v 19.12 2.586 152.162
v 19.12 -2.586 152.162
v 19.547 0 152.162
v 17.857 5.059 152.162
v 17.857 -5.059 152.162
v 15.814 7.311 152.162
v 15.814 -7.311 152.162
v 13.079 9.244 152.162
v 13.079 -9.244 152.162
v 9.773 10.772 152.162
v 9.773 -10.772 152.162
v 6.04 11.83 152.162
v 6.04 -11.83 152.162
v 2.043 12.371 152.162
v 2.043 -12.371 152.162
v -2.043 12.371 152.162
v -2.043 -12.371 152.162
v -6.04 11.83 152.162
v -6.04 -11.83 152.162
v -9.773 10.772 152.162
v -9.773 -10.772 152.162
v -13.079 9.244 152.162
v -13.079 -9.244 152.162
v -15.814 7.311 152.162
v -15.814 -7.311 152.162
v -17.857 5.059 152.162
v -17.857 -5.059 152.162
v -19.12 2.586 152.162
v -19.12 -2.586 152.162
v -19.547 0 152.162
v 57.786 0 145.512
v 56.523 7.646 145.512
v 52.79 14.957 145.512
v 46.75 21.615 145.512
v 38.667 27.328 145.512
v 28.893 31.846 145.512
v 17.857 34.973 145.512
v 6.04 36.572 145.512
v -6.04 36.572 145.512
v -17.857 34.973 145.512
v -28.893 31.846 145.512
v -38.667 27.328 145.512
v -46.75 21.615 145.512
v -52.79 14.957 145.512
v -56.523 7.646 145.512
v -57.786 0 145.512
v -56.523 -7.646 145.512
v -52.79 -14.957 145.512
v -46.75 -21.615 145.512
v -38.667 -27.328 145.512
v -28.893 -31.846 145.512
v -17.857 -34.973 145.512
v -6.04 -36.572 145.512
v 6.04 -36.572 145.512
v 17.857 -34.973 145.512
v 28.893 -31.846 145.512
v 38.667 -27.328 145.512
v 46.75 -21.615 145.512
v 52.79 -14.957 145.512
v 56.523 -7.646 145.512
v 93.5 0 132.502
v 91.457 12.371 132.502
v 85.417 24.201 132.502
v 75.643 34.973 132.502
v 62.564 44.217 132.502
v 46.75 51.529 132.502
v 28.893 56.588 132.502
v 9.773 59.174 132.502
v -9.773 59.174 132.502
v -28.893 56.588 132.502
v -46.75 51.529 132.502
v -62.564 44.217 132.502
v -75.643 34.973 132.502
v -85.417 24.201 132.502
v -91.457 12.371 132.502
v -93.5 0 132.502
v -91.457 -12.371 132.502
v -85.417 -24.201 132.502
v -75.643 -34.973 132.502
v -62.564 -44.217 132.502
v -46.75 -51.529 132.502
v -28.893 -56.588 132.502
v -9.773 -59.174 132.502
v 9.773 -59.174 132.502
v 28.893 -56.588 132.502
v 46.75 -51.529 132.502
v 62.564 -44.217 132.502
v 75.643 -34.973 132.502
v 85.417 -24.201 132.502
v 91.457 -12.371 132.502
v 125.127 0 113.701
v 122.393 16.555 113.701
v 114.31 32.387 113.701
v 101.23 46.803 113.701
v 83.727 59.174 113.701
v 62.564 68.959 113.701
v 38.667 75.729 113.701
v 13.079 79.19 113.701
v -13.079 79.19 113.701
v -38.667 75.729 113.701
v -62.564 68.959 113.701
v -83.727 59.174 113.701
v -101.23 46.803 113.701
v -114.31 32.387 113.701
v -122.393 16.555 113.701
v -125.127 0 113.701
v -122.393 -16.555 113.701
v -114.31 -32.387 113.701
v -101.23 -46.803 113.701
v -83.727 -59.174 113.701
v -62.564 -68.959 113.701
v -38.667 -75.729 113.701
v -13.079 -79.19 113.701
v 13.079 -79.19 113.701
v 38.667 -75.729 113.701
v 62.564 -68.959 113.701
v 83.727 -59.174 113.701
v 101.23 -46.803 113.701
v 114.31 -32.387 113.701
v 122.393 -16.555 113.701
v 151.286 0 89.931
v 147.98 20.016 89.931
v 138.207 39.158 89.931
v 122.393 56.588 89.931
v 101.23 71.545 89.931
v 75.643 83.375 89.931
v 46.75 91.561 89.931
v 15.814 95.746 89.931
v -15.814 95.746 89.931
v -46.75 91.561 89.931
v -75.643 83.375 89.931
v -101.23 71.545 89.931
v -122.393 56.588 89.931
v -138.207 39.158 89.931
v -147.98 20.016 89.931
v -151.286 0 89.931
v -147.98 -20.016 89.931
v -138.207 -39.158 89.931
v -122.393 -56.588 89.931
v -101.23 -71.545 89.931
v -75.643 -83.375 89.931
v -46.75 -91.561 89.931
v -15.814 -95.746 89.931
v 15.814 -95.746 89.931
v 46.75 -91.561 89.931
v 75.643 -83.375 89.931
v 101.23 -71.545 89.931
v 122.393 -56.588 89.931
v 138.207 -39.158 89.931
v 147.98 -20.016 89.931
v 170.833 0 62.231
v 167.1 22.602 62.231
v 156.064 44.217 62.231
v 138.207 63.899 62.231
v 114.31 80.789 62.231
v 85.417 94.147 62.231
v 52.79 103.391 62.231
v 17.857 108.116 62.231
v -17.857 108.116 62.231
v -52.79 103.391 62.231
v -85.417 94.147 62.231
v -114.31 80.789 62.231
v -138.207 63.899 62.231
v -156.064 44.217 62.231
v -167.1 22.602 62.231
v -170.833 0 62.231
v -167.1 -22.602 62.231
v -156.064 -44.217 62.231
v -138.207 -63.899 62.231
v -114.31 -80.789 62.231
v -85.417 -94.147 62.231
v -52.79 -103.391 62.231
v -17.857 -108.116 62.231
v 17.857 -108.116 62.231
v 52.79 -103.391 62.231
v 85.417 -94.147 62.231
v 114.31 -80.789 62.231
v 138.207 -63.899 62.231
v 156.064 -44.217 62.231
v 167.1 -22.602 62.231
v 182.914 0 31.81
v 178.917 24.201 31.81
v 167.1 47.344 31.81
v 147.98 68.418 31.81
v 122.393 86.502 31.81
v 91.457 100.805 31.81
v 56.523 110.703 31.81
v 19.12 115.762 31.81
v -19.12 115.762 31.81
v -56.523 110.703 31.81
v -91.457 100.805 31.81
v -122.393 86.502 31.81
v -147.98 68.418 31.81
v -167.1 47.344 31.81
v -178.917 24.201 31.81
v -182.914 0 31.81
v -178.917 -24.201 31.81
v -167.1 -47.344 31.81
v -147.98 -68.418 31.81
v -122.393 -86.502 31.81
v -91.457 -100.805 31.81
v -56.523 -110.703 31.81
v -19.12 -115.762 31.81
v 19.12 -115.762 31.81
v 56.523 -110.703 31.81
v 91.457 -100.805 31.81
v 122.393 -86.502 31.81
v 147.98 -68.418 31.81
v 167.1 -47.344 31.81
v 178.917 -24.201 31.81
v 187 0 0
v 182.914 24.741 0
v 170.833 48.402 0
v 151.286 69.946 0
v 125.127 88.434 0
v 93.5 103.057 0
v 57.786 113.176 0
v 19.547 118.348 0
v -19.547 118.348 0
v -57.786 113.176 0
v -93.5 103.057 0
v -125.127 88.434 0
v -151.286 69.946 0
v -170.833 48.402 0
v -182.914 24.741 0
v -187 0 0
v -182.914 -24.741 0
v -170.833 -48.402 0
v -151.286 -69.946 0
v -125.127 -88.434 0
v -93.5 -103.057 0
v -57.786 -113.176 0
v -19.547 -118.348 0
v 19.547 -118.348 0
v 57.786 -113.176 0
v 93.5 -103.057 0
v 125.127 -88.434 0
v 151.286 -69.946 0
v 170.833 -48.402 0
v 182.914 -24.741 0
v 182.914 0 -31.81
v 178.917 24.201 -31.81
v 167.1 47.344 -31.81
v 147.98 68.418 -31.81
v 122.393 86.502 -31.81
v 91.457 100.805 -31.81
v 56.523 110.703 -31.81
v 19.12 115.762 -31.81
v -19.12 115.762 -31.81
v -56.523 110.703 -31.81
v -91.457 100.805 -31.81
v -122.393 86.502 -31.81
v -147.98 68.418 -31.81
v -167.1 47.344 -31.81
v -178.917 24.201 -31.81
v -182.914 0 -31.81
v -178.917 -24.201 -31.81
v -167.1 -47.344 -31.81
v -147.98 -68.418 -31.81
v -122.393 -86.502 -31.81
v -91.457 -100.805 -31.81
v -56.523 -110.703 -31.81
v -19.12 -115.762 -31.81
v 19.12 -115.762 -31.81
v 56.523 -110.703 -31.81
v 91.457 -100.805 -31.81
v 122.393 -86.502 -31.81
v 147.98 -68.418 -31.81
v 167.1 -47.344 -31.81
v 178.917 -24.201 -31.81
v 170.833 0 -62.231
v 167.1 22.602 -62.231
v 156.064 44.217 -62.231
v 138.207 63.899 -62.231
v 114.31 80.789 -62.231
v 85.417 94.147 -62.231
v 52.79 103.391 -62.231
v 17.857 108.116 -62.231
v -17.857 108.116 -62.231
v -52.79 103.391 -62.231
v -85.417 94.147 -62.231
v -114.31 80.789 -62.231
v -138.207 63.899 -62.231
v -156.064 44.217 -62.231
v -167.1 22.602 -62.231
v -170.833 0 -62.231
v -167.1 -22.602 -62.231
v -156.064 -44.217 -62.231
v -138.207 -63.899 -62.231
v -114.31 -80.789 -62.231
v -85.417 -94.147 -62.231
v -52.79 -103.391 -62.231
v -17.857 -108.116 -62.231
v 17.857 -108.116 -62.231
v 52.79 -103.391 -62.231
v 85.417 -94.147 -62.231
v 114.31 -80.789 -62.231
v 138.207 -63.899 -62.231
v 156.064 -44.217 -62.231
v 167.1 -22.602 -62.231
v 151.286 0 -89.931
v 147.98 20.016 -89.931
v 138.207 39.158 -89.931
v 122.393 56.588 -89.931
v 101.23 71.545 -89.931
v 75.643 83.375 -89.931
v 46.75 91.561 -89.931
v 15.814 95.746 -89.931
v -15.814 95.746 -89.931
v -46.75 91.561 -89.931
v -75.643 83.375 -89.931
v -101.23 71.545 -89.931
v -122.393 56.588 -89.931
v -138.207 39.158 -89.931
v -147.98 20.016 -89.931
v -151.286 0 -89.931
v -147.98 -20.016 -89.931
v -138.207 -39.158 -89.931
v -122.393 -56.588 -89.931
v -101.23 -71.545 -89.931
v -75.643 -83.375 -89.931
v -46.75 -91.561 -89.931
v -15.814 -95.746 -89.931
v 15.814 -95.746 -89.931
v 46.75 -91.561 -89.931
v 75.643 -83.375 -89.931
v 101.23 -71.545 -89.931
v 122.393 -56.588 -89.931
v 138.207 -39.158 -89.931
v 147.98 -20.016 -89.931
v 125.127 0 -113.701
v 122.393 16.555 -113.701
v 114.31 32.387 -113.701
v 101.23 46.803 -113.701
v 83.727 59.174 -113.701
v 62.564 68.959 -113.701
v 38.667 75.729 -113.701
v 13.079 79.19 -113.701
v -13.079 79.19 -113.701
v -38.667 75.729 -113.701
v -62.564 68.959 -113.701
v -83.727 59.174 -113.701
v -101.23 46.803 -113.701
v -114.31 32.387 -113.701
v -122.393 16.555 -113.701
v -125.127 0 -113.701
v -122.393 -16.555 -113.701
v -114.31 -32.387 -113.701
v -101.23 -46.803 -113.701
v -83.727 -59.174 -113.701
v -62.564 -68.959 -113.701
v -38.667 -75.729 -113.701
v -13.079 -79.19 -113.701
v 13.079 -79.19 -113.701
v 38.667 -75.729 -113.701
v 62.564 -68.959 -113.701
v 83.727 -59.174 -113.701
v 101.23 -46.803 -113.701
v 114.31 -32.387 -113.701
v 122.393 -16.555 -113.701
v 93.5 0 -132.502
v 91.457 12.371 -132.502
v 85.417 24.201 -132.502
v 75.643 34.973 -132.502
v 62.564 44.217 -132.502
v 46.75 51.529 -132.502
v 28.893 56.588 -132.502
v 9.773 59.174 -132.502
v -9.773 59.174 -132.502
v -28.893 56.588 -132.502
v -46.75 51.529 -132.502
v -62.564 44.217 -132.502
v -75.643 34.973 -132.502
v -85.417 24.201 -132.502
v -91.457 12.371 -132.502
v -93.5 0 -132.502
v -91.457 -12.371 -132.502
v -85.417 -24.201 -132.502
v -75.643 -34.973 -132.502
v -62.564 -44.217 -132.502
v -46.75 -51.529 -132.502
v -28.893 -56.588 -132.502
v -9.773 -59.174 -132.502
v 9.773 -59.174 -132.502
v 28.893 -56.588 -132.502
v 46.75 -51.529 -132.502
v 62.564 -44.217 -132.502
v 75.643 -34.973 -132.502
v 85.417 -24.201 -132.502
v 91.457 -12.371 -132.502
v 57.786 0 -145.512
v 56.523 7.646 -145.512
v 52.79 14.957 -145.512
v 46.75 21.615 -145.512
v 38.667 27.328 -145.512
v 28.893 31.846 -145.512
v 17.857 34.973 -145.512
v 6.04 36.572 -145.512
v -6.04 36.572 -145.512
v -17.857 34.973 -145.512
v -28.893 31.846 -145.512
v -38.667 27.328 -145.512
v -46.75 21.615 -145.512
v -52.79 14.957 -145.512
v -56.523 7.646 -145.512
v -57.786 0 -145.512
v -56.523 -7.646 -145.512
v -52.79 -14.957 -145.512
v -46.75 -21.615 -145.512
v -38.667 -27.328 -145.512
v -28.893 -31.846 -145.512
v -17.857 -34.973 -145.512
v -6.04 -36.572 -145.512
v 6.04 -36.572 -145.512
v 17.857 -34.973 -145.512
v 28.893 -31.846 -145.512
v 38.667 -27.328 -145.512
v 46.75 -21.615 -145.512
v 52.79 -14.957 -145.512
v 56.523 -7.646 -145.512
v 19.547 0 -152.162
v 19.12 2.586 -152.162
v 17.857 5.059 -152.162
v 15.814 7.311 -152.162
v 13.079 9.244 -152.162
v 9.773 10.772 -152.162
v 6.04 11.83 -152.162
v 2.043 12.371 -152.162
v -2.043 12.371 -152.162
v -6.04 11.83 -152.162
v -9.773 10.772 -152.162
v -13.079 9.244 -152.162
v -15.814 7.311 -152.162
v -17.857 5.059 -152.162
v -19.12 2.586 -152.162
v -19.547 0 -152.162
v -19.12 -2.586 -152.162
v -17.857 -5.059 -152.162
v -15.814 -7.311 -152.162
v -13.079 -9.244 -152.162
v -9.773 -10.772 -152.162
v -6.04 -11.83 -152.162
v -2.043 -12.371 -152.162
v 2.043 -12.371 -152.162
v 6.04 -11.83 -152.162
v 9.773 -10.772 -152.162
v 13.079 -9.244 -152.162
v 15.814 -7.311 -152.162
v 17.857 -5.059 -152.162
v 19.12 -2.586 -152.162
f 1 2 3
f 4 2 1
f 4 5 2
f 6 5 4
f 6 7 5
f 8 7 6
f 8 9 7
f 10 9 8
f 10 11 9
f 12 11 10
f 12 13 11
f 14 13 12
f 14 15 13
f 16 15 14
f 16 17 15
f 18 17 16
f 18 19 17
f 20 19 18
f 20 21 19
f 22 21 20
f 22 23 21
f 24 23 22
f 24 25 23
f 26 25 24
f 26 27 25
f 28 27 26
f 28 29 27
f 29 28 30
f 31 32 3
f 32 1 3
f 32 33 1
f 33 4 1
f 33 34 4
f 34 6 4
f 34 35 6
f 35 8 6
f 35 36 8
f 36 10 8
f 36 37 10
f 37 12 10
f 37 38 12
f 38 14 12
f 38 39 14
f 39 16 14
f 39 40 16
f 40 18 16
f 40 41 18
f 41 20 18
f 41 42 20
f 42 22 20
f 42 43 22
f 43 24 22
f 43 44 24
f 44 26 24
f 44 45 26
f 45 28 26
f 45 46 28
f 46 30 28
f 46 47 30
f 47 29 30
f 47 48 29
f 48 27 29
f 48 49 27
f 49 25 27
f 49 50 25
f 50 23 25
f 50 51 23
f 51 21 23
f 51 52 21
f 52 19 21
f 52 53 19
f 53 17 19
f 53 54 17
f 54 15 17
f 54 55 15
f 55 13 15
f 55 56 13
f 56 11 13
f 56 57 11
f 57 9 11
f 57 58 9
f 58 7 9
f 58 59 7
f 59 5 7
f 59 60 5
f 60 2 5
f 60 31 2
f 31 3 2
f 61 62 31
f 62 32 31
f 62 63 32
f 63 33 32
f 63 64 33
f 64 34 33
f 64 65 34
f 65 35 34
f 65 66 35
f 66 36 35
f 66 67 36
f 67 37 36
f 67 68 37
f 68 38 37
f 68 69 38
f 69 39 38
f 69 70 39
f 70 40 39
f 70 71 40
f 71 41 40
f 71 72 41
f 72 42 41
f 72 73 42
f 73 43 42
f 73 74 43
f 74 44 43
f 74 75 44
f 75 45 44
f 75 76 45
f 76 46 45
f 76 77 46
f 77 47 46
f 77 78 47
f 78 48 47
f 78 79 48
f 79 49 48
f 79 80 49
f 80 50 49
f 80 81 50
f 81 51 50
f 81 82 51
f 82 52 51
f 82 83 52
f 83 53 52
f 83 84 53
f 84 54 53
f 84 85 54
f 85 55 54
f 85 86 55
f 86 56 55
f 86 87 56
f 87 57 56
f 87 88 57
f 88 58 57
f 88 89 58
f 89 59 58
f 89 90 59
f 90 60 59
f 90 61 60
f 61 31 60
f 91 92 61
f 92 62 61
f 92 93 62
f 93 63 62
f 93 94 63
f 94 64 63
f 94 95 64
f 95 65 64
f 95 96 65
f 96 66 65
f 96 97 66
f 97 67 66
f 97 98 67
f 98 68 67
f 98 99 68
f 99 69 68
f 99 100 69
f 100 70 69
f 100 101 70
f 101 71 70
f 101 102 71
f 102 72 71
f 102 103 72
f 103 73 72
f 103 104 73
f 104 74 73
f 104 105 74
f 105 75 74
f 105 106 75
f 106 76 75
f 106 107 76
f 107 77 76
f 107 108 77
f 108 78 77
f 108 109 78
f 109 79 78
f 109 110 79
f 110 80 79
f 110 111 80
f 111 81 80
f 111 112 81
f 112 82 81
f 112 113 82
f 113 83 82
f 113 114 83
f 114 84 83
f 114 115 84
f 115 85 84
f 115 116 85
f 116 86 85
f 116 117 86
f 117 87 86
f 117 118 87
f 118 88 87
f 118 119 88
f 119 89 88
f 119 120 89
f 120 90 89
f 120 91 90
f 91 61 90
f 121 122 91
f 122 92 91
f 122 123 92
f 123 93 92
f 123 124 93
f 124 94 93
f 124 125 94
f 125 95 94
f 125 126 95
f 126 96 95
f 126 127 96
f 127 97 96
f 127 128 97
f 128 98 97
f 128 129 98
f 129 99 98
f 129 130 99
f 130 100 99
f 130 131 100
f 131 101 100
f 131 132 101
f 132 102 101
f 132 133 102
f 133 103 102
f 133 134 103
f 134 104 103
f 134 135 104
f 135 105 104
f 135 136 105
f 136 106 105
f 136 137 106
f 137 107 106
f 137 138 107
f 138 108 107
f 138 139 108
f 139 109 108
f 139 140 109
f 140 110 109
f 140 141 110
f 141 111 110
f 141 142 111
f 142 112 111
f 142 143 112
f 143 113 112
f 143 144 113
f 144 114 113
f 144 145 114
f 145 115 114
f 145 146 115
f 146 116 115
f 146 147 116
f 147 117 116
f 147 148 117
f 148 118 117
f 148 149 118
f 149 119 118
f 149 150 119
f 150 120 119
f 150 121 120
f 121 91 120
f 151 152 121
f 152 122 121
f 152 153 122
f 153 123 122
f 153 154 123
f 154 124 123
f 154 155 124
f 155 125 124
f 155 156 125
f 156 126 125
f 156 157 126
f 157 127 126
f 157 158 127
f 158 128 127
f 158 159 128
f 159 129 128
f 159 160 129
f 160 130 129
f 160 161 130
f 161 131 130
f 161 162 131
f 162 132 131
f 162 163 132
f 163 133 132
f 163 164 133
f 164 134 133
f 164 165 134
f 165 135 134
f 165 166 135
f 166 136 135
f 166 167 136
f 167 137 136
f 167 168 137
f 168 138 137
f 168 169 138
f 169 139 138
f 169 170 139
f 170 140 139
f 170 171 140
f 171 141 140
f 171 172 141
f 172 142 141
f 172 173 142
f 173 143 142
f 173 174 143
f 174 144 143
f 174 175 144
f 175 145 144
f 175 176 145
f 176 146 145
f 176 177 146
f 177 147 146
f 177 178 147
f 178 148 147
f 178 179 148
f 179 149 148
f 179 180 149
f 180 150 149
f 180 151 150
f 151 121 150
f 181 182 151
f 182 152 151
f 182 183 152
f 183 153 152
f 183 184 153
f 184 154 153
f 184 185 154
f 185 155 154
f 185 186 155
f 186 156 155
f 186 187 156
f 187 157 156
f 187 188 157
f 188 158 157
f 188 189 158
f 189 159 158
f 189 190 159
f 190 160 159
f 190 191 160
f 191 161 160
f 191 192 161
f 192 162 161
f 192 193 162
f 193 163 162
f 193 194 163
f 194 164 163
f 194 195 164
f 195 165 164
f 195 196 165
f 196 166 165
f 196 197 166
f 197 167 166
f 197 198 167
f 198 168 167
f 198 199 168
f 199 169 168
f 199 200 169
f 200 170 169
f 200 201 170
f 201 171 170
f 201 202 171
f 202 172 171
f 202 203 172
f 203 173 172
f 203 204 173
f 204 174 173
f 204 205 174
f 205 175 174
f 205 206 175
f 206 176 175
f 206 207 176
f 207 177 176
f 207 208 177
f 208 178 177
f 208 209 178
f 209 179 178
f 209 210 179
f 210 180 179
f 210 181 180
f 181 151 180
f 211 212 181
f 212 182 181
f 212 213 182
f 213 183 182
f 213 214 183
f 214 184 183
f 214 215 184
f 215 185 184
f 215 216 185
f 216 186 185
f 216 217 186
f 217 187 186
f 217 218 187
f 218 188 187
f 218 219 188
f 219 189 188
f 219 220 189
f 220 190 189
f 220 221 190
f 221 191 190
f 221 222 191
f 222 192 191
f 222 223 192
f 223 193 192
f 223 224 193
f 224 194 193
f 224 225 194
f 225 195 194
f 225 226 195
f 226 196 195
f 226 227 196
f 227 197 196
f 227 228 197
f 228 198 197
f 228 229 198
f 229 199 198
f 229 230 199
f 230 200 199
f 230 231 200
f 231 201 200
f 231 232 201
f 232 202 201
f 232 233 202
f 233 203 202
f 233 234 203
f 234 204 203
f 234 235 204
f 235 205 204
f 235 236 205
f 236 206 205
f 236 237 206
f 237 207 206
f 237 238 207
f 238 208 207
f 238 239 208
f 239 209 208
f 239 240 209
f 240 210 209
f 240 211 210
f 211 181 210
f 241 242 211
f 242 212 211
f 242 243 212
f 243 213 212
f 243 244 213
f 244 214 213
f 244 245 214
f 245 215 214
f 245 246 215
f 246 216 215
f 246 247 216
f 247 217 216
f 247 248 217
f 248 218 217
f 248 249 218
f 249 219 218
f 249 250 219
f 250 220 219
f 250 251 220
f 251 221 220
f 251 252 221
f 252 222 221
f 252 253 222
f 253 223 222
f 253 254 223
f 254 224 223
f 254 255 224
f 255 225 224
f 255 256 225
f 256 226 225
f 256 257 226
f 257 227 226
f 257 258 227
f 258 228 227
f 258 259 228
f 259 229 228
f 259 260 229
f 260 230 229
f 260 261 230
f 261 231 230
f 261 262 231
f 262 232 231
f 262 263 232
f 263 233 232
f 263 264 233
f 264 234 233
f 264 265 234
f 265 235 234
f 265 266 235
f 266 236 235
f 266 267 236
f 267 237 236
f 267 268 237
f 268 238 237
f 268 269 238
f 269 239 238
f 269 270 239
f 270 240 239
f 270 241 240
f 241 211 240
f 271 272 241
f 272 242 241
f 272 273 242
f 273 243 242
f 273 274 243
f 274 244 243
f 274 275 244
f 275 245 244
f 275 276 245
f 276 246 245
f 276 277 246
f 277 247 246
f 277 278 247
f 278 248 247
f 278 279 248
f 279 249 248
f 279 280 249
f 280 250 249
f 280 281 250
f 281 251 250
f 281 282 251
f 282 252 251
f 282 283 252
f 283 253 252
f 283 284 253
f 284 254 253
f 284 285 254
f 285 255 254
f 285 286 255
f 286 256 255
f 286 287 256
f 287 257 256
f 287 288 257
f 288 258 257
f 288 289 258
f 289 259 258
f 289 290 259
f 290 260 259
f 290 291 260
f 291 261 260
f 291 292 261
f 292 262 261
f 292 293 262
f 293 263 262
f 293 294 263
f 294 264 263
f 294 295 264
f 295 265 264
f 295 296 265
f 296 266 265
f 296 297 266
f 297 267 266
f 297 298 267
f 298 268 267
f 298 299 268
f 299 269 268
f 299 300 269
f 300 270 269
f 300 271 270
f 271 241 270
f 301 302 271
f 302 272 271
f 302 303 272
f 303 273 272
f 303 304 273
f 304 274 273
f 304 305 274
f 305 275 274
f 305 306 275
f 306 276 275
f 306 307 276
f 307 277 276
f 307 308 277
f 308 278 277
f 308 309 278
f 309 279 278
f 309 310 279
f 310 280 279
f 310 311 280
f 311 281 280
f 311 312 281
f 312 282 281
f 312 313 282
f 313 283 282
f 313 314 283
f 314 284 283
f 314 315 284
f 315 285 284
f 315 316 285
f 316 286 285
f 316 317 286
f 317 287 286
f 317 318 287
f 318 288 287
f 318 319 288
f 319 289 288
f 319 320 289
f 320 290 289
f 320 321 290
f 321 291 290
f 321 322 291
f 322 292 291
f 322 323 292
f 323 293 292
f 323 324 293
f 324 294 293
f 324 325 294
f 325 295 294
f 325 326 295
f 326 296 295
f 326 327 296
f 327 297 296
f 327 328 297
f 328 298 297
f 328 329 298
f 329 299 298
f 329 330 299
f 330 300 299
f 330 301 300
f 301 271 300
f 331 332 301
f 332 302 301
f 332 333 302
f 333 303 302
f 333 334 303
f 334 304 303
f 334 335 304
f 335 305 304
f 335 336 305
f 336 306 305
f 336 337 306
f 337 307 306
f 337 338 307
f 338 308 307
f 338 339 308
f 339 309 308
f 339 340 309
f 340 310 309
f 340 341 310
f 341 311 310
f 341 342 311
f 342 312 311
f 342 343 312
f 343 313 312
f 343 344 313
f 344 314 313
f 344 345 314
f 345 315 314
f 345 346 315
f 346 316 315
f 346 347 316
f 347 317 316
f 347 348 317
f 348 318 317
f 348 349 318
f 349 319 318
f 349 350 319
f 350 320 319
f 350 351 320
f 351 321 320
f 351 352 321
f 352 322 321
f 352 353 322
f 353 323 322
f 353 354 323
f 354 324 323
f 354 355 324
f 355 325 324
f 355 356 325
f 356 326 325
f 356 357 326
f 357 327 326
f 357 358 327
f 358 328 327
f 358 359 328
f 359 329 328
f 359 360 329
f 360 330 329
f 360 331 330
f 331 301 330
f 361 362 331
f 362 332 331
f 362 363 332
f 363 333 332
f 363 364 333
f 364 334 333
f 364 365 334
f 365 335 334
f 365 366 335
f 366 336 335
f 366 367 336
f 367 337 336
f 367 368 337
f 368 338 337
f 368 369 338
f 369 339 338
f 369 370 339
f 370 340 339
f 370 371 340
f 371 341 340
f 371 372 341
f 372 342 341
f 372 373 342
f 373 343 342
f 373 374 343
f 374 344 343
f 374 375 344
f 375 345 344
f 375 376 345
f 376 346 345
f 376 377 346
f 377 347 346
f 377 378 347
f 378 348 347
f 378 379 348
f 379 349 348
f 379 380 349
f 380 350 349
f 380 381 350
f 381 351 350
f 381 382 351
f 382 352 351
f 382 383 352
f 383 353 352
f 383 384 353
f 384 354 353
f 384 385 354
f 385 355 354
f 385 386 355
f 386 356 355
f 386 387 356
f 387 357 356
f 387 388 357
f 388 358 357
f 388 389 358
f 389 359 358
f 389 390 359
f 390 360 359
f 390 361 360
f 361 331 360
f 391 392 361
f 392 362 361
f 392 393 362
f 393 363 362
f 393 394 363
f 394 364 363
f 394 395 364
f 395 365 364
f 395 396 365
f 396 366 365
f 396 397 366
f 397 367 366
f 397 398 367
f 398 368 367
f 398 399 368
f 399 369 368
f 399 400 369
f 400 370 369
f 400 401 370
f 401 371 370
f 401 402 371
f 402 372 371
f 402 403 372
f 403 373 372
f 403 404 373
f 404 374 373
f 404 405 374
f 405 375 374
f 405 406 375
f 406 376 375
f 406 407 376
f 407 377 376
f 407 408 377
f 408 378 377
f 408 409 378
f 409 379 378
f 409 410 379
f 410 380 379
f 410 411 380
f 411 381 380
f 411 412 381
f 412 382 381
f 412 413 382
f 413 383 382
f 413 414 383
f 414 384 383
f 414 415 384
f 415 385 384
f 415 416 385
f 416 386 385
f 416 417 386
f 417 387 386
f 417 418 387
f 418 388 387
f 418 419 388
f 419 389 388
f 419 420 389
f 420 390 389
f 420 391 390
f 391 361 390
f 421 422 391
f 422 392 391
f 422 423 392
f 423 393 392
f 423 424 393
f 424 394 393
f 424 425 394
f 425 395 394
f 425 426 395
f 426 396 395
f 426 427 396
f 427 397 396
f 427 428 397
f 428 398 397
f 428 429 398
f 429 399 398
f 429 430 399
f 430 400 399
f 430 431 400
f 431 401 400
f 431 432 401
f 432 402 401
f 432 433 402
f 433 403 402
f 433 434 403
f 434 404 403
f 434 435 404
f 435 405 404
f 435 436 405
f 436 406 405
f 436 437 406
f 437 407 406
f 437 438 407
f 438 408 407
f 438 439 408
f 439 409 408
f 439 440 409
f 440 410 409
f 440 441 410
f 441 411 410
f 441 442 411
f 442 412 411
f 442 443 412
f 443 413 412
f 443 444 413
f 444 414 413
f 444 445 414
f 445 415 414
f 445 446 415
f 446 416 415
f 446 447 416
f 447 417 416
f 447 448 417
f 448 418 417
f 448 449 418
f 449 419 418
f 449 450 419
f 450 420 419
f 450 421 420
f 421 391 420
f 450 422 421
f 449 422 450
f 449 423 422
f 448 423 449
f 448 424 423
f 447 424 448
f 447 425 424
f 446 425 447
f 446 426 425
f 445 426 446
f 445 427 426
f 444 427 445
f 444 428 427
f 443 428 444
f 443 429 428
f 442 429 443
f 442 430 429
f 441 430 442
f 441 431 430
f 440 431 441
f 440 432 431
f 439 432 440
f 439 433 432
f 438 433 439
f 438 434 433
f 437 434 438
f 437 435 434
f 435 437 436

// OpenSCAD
// Generated by SolidPython 1.0.1 on 2020-07-29 00:46:49


scale(v = [11, 7, 9]) {
	sphere(r = 17);
}
/***********************************************
*********      SolidPython code:      **********
************************************************
 
# import packages: SolidPython
from solid import *
from solid.utils import *
from itertools import chain, combinations, permutations


class Resize:

    def __init__(self, scad_file):
        self.scad_file = scad_file
        #self.scad_file = import_scad(scad_file)
        # cone/cylinder param:
        self.r1 = 0
        self.r2 = 0
        self.h = 0
        # rectangular prism param:
        self.w = 0
        self.l = 0
        # ellipse param:
        self.r = 0

    # import OpenScad code (file name corresponds to shape)


    # classify shape + parameters
    def assign(self, param1, param2, param3):
        if self.scad_file == 'cone.scad':
            self.r1 = param1
            self.r2 = param2
            self.h = param3
        elif self.scad_file == 'cylinder.scad':
            self.r1 = param1
            self.r2 = param2
            self.h = param3
        elif self.scad_file == 'rectangularPrism.scad':
            self.h = param1
            self.l = param2
            self.w = param3
        else:
            self.r = param1
            self.h = param2

    # resize parameters
    def iterate(self):
        x = range(3, 20, 2)
        i = 1
        if self.scad_file == 'cone.scad':
            tempList = list(permutations(x, 2))
            for temp in tempList:
                param1 = temp[0]
                param2 = temp[1]
                filepath = 'produced_scad_files/' + 'cone' + str(param1) + '_' + str(param2) + '_' + '.scad'
                scad_render_to_file(cylinder(h=param1, r1=param2, r2=0), filepath)

        elif self.scad_file == 'cylinder.scad':
            tempList = list(permutations(x, 3))
            for temp in tempList:
                param1 = temp[0]
                param2 = temp[1]
                filepath = 'produced_scad_files/' + 'cylinder' + str(param1) + '_' + str(param2) + '_' + '.scad'
                scad_render_to_file(cylinder(h=param1, r1=param2, r2=param2), filepath)

        elif self.scad_file == 'rectangularPrism.scad':
            tempList = list(permutations(x, 3))
            for temp in tempList:
                param1 = temp[0]
                param2 = temp[1]
                param3 = temp[2]
                filepath = 'produced_scad_files/' + 'rectangularPrism' + str(param1) + '_' + str(param2) + '_' + str(
                    param3) + '.scad'
                scad_render_to_file(cube(size=(param1, param2, param3)), filepath)

        elif self.scad_file == 'ellipse.scad':
            tempList = list(permutations(x, 4))
            for temp in tempList:
                param1 = temp[0]
                param2 = temp[1]
                param3 = temp[2]
                param4 = temp[3]
                filepath = 'produced_scad_files/' + 'ellipse' + str(param1) + '_' + str(param2) + '_' + str(param3) + '_' + str(param4) + '.scad'
                scad_render_to_file(scale([param1, param2, param3])(sphere(r=param4)), filepath)

    def render_to_scadfile(self):
        scad_render_to_file(scad, 'example.scad') 
 
************************************************/
